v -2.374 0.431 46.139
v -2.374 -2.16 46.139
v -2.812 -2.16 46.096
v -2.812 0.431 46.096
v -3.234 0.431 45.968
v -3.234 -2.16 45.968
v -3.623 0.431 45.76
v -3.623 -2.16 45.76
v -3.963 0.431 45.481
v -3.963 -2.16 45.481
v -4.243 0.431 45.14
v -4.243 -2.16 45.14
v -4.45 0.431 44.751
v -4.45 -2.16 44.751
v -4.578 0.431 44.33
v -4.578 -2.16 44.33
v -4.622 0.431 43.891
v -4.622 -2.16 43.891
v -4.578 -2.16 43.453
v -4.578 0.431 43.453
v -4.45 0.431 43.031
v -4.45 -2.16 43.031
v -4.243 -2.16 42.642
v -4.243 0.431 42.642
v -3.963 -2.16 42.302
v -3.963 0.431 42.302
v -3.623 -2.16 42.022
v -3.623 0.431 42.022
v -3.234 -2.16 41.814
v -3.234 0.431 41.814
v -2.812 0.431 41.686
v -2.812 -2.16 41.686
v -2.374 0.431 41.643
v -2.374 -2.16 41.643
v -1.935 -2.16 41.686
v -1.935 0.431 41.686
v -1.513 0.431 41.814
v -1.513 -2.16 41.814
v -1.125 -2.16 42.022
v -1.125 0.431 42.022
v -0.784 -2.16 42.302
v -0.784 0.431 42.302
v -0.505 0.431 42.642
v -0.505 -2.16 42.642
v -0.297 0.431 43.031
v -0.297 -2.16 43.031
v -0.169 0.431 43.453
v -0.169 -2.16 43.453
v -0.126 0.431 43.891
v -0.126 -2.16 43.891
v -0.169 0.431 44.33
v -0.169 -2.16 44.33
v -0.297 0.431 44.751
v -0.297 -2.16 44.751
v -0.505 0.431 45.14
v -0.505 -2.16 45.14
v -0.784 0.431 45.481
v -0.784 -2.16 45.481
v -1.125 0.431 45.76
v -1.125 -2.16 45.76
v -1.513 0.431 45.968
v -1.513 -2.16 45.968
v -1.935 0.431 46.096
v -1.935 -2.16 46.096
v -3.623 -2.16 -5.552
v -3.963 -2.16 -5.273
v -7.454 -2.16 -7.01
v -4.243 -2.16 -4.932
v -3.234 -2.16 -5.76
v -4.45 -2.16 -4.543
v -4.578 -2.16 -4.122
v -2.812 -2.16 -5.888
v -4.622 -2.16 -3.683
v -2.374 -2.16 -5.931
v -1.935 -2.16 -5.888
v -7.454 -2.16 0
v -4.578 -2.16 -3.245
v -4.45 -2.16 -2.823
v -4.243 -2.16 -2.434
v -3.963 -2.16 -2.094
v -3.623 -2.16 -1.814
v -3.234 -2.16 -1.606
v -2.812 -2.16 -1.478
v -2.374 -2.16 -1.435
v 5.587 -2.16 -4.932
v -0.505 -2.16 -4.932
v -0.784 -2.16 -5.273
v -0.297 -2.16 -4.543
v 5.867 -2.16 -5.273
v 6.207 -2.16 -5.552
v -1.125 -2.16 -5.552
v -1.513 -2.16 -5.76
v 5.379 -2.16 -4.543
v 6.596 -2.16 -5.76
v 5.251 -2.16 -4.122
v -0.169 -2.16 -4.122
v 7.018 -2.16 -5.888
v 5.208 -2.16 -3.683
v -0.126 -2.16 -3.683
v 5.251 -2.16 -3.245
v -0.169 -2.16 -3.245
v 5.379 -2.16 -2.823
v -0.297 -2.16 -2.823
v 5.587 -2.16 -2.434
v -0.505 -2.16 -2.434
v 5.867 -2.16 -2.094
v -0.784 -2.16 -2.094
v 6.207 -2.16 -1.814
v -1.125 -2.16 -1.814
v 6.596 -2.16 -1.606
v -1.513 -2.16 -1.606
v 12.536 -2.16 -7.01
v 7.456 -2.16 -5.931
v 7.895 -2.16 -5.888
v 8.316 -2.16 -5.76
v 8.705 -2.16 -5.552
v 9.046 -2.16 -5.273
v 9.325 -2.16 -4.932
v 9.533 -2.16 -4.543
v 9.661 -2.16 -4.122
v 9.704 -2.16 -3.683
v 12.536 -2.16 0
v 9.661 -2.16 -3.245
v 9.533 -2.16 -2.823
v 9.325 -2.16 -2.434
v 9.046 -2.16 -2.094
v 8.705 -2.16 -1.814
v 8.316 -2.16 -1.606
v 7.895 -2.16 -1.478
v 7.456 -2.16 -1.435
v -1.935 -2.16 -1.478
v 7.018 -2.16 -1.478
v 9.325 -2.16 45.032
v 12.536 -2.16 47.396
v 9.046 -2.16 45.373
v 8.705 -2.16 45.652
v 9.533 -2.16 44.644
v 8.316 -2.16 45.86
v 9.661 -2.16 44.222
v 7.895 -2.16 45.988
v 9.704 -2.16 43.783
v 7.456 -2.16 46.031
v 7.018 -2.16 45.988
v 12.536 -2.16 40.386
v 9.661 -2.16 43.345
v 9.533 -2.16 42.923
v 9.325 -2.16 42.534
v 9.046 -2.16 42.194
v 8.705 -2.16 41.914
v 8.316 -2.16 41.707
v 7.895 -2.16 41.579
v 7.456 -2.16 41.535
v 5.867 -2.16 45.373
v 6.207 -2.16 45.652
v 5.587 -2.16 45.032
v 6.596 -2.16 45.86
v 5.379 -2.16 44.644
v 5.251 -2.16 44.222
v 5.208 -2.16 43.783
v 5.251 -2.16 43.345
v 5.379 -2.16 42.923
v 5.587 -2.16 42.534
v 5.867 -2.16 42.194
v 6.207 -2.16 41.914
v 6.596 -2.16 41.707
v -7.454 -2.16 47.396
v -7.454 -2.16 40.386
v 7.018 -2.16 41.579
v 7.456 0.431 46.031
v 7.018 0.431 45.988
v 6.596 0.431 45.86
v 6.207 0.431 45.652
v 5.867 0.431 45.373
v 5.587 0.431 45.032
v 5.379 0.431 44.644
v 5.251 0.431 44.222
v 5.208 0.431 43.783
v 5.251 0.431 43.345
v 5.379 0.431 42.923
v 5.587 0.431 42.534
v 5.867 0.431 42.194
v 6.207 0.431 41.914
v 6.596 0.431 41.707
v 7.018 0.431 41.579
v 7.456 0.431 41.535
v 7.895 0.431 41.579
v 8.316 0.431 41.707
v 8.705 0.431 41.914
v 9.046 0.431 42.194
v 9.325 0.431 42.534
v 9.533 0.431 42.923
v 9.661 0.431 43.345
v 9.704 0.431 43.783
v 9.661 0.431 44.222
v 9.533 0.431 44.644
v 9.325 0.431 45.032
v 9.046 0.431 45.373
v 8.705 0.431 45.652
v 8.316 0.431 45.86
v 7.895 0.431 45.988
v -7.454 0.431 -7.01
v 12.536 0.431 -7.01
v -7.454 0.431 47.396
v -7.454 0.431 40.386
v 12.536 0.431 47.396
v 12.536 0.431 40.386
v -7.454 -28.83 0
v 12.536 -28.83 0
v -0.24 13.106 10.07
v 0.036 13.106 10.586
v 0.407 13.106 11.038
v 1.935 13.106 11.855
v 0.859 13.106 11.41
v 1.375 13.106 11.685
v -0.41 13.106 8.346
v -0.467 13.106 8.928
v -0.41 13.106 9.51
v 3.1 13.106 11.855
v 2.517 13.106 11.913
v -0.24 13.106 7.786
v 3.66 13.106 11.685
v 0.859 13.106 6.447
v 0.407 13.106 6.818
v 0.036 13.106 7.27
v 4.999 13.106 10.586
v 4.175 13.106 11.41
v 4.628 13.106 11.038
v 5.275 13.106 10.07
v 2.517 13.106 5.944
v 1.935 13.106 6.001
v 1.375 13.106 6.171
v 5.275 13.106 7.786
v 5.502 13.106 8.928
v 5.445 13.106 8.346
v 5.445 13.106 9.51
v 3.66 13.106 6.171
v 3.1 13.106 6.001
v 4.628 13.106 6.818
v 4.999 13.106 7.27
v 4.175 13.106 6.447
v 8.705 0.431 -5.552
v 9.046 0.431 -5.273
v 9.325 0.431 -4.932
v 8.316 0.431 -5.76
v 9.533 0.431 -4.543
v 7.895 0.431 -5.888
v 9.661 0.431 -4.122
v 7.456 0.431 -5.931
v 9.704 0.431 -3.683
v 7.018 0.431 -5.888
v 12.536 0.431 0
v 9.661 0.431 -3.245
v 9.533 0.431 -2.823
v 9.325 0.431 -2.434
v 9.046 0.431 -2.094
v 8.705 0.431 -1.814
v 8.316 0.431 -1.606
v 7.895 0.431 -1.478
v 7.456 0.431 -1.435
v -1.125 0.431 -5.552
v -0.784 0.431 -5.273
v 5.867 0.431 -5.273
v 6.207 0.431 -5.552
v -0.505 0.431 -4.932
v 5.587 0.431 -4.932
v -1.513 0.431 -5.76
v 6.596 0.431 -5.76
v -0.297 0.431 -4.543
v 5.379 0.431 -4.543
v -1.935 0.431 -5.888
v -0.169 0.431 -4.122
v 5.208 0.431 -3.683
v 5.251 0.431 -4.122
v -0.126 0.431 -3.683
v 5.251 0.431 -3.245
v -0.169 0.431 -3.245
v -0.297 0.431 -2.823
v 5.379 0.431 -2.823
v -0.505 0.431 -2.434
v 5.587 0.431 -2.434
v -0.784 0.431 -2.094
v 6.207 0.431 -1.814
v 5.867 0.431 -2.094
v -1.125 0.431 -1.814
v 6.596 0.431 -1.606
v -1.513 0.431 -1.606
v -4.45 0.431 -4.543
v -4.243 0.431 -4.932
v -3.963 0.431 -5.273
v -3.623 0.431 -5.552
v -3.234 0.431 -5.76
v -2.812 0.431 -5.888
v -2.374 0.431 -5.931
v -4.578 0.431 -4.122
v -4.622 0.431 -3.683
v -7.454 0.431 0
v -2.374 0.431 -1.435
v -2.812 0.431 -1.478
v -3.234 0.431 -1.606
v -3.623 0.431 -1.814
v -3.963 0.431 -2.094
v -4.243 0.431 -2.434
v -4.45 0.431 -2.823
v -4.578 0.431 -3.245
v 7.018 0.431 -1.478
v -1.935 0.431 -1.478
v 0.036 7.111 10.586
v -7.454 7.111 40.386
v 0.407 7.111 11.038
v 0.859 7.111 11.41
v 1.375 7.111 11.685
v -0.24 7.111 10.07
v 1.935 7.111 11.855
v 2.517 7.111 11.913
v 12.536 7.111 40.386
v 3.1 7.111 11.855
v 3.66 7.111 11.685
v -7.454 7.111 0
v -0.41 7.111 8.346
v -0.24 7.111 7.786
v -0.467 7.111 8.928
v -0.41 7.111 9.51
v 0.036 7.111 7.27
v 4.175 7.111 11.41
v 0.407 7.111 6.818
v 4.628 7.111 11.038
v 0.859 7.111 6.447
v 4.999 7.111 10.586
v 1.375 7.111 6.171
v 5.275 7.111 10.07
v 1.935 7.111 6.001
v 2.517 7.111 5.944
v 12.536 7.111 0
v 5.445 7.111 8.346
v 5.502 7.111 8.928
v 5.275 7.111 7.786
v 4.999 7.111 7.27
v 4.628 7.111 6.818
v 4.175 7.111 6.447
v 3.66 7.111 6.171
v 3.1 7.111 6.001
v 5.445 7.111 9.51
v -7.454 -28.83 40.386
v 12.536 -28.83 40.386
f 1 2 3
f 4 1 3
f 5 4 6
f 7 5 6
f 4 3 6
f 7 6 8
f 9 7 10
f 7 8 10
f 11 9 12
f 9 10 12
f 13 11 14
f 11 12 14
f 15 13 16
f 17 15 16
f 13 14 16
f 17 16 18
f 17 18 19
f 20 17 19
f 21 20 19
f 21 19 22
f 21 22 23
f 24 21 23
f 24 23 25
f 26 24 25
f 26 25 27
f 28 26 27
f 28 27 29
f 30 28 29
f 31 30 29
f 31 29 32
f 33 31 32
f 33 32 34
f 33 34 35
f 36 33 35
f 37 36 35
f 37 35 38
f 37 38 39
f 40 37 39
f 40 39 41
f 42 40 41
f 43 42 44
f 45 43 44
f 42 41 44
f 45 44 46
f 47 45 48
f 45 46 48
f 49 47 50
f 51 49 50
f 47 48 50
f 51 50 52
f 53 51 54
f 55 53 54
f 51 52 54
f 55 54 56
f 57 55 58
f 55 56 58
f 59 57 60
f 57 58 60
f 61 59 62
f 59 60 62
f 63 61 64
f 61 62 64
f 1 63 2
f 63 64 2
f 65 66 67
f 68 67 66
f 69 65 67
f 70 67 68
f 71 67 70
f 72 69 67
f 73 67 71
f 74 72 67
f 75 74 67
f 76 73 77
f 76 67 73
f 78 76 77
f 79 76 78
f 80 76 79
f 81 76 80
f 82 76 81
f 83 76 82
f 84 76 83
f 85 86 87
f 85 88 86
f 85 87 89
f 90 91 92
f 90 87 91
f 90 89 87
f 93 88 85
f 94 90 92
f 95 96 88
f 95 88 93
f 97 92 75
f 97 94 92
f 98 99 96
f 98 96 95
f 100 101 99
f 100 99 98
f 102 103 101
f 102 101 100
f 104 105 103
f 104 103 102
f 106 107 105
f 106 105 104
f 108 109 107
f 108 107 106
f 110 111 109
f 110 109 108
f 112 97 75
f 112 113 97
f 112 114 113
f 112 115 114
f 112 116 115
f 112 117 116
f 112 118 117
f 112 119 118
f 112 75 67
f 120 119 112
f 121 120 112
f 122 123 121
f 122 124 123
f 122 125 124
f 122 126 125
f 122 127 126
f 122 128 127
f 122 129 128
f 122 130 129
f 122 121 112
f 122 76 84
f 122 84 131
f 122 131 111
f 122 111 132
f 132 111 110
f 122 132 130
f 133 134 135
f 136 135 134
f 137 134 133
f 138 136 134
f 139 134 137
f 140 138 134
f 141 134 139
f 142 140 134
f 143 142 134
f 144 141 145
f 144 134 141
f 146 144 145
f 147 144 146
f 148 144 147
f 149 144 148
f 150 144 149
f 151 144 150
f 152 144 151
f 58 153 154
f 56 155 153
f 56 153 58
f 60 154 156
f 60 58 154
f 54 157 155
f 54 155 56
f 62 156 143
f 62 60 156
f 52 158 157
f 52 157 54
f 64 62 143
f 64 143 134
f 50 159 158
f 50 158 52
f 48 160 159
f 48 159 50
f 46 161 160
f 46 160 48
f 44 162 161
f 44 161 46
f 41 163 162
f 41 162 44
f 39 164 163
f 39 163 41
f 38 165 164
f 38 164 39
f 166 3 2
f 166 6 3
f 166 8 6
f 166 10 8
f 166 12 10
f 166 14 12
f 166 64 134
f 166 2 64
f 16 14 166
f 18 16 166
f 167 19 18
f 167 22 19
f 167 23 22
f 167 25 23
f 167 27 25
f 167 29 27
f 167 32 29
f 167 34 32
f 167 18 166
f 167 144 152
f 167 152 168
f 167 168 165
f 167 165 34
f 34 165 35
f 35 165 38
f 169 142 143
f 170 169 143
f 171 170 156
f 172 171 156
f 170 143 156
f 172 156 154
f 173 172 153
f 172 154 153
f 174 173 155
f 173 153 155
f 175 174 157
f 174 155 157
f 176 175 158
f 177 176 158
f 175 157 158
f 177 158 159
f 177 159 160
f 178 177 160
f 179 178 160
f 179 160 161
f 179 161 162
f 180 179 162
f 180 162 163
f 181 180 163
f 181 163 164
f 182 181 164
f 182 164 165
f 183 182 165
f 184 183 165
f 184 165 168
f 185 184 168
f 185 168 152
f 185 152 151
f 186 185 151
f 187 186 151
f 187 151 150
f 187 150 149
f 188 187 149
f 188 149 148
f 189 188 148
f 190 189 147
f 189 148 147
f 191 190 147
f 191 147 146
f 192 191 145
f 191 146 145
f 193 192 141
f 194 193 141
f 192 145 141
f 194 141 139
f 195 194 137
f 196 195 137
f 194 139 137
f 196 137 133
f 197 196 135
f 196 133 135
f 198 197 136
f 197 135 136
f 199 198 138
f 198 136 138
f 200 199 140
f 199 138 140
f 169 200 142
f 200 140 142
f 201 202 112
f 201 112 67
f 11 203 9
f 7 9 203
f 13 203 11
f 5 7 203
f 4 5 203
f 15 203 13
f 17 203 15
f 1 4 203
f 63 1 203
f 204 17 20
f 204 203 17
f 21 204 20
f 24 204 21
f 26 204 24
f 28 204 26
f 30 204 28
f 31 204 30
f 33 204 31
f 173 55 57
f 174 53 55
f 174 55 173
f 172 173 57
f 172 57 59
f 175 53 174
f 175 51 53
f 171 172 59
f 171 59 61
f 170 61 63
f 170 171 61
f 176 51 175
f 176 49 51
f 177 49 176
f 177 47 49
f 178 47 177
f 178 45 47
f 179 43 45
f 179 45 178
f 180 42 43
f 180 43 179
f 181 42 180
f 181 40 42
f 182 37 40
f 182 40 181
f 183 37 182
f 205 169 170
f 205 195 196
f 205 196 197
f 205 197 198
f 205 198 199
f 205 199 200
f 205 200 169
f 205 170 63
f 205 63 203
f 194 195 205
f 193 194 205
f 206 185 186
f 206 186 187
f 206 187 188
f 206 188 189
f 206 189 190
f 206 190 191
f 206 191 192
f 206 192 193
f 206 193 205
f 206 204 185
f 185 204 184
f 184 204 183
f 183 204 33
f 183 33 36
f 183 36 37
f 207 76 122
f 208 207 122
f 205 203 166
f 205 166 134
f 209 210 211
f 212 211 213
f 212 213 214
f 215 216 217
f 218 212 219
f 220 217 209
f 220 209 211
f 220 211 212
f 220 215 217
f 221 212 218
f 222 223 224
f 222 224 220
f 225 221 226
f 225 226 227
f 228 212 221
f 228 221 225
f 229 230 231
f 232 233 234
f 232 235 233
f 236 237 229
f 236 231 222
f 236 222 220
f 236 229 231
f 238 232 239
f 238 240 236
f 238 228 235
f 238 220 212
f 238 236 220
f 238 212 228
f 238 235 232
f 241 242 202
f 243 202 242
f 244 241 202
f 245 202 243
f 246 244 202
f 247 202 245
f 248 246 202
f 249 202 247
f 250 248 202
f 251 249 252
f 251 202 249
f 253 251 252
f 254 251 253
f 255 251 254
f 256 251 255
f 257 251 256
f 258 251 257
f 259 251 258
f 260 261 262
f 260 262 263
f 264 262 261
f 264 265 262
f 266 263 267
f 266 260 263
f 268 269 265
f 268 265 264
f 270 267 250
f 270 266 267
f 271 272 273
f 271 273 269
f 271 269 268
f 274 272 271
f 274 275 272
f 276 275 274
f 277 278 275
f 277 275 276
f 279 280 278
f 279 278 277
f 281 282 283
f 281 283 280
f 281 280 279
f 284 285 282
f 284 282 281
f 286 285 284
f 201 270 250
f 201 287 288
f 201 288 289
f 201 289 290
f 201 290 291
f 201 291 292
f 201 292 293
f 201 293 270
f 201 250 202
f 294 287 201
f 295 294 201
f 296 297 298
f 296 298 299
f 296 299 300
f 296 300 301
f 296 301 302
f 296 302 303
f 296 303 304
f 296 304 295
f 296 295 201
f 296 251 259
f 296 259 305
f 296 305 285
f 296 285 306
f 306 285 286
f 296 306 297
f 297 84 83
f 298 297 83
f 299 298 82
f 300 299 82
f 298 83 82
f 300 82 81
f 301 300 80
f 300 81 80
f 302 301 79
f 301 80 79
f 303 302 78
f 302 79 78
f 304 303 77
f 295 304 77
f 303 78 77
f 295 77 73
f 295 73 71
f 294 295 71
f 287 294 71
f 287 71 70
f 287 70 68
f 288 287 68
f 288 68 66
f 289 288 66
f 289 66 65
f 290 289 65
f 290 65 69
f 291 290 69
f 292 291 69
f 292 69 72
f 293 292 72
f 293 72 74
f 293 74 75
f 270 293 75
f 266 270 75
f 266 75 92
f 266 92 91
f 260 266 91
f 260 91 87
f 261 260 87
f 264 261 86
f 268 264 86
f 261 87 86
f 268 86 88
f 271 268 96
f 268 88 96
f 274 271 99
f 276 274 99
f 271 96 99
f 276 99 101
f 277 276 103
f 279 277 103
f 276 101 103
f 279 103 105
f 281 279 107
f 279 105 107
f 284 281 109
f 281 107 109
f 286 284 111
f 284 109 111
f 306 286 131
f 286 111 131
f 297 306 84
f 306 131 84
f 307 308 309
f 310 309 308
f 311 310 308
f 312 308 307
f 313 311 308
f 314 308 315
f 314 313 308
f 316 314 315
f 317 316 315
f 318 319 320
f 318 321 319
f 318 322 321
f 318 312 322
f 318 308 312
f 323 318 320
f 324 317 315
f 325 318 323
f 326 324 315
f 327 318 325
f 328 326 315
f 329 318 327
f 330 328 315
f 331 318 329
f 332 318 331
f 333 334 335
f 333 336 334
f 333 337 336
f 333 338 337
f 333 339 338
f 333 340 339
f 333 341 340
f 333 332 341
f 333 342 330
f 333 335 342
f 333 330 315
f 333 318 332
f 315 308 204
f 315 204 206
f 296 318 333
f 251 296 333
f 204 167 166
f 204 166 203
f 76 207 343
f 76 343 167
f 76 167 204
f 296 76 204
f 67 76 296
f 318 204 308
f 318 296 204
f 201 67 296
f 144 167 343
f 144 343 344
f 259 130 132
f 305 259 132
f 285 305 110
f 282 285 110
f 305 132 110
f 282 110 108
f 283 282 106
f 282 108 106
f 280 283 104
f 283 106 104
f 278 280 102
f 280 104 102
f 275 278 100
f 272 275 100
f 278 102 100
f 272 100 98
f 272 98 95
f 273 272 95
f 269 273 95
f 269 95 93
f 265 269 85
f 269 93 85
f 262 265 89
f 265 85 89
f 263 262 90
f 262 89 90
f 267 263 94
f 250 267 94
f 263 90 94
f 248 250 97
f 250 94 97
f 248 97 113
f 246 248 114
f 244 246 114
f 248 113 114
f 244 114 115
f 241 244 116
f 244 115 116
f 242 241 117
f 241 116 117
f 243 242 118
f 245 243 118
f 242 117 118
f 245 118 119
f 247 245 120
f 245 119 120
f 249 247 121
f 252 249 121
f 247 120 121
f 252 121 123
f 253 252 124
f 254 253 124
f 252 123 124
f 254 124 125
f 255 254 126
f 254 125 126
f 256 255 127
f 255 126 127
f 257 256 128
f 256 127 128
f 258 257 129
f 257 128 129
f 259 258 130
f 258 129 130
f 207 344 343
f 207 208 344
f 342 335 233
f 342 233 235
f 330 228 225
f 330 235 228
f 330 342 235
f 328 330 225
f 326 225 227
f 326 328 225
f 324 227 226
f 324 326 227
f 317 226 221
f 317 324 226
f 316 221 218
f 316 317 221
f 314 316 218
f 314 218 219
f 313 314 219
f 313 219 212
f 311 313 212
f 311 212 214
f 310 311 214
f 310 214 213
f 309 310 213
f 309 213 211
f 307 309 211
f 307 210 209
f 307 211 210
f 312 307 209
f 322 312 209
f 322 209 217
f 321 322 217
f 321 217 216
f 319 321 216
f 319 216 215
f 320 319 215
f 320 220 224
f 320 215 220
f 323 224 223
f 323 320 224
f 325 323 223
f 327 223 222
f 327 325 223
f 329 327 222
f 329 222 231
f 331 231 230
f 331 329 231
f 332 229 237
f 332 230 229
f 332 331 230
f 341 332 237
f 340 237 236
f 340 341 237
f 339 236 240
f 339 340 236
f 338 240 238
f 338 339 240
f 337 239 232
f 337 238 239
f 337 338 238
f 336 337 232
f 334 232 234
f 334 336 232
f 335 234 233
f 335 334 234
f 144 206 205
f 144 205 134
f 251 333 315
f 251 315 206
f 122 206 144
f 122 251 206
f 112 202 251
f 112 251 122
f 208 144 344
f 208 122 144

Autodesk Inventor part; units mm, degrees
ref_plane "YZ Plane" through (0, 0, 0) normal (1, 0, 0) x (0, 1, 0)
ref_plane "XZ Plane" through (0, 0, 0) normal (0, 1, 0) x (-1, 0, 0)
ref_plane "XY Plane" through (0, 0, 0) normal (0, 0, 1) x (1, 0, 0)
sketch "Sketch1" plane through (0, 0, 0) normal (0, 0, 1) x (1, 0, 0)
  line L0 (-7.4537, 7.1113) -> (12.5361, 7.1113)
  line L1 (12.5361, 7.1113) -> (12.5361, -28.8297)
  line L2 (12.5361, -28.8297) -> (-7.4537, -28.8297)
  line L3 (-7.4537, -28.8297) -> (-7.4537, 7.1113)
  point P0 (0, 0)
  dimension "d0" = 19.9898
  dimension "d1" = 35.941
extrude "Extrusion1" add sketch "Sketch1" along normal blind 40.386
sketch "Sketch2" plane through (0, 0, 0) normal (0, 0, -1) x (-1, 0, 0)
  line L0 (-12.5361, -28.8297) -> (-12.5361, 7.1113) projected
  line L1 (7.4537, -28.8297) -> (7.4537, 7.1113) projected
  line L2 (-12.5361, 0.4311) -> (7.4537, 0.4311)
  line L3 (7.4537, 0.4311) -> (7.4537, -2.1597)
  line L4 (7.4537, -2.1597) -> (-12.5361, -2.1597)
  line L5 (-12.5361, -2.1597) -> (-12.5361, 0.4311)
  line L6 (7.4537, 7.1113) -> (-12.5361, 7.1113) projected
  line L7 (-12.5361, -28.8297) -> (7.4537, -28.8297) projected
  line L8 (7.4537, 7.1113) -> (7.4537, -28.8297) projected
  line L9 (7.4537, 0.4311) -> (-12.5361, 0.4311)
  line L10 (-12.5361, 0.4311) -> (-12.5361, -2.1597)
  line L11 (-12.5361, -2.1597) -> (7.4537, -2.1597)
  line L12 (7.4537, -2.1597) -> (7.4537, 0.4311)
  point P0 (0, 0)
  dimension "d4" = 6.6802
  dimension "d5" = 2.5908
  dimension "d6" = 26.67
  dimension "d7" = 19.9898
  dimension "d8" = 2.5908
extrude "Extrusion2" add sketch "Sketch2" along normal blind 7.0104 contours L0 L2 L1 L4
sketch "Sketch3" plane through (0, 0, 40.386) normal (0, 0, 1) x (1, 0, 0)
  point P0 (0, 0)
sketch "Sketch4" plane through (0, 0, 40.386) normal (0, 0, 1) x (1, 0, 0)
  line L0 (-7.4537, -2.1597) -> (-7.4537, 0.4311) projected
  line L1 (12.5361, -2.1597) -> (-7.4537, -2.1597) projected
  line L2 (-7.4537, 0.4311) -> (12.5361, 0.4311)
  line L3 (12.5361, 0.4311) -> (12.5361, -2.1597)
  line L4 (12.5361, -2.1597) -> (-7.4537, -2.1597)
  line L5 (-7.4537, -2.1597) -> (-7.4537, 0.4311)
  point P0 (0, 0)
extrude "Extrusion3" add sketch "Sketch4" along normal blind 7.0104
sketch "Sketch5" plane through (-7.4537, 0.4311, 40.386) normal (0, 1, 0) x (1, 0, 0)
  circle A0 centre (14.9098, -3.3973) radius 2.2479
  line L0 (19.9898, 0) -> (19.9898, -7.0104) projected
  circle A1 centre (5.08, -3.5052) radius 2.2479
  line L1 (0, 0) -> (0, -7.0104) projected
  point P0 (7.4537, 40.386)
  dimension "d13" = 5.08
  dimension "d14" = 5.08
  dimension "d15" = 4.4958
  dimension "d16" = 4.4958
  dimension "d17" = 5.3346
sketch "Sketch6" plane through (-7.4537, 7.1113, 0) normal (0, 1, 0) x (1, 0, 0)
  point P0 (7.4537, 0)
sketch "Sketch7" plane through (-7.4537, 0.4311, 0) normal (0, 1, 0) x (1, 0, 0)
  circle A0 centre (14.9098, 3.6831) radius 2.2479
  circle A1 centre (5.08, 3.6831) radius 2.2479
  line L0 (19.9898, 0) -> (19.9898, 7.0104) projected
  line L1 (0, 0) -> (0, 7.0104) projected
  point P0 (7.4537, 0)
  dimension "d18" = 5.08
  dimension "d19" = 5.08
  dimension "d20" = 4.4958
  dimension "d21" = 4.4958
  dimension "d22" = 5.334
hole "Hole1" at (7.4561, 0.4311, 43.7833) at (-2.3737, 0.4311, 43.8912) direction (0, -1, 0) diameter 4.4958 end through all
hole "Hole2" at (7.4561, 0.4311, -3.6831) at (-2.3737, 0.4311, -3.6831) direction (0, -1, 0) diameter 4.4958 end through all
sketch "Sketch8" plane through (-7.4537, 7.1113, 0) normal (0, 1, 0) x (1, 0, 0)
  circle A0 centre (9.9711, -8.9281) radius 2.9845
  line L0 (0, 0) -> (19.9898, 0) projected
  point P0 (7.4537, 0)
  dimension "d37" = 5.9436
  dimension "d38" = 5.969
extrude "Extrusion4" add sketch "Sketch8" along normal blind 5.9944
sketch "Sketch9" plane through (0, 0, 0) normal (0, 0, -1) x (-1, 0, 0)
  point P0 (0, 0)
sketch "Sketch10" plane through (-7.4537, 7.1113, 0) normal (0, 1, 0) x (1, 0, 0)
  line L0 (0, 0) -> (19.9898, 0) projected
  line L1 (19.9898, 0) -> (19.9898, -40.386) projected
  line L2 (0, 0) -> (0, -40.386) projected
  line L3 (19.9898, -40.386) -> (0, -40.386) projected
  circle A0 centre (14.9098, -43.7833) radius 2.2479 projected
  circle A1 centre (5.08, -43.8912) radius 2.2479 projected
  circle A2 centre (14.9098, 3.6831) radius 2.2479 projected
  circle A3 centre (5.08, 3.6831) radius 2.2479 projected
  point P0 (7.4537, 0)
properties part number "RTS Motor"
